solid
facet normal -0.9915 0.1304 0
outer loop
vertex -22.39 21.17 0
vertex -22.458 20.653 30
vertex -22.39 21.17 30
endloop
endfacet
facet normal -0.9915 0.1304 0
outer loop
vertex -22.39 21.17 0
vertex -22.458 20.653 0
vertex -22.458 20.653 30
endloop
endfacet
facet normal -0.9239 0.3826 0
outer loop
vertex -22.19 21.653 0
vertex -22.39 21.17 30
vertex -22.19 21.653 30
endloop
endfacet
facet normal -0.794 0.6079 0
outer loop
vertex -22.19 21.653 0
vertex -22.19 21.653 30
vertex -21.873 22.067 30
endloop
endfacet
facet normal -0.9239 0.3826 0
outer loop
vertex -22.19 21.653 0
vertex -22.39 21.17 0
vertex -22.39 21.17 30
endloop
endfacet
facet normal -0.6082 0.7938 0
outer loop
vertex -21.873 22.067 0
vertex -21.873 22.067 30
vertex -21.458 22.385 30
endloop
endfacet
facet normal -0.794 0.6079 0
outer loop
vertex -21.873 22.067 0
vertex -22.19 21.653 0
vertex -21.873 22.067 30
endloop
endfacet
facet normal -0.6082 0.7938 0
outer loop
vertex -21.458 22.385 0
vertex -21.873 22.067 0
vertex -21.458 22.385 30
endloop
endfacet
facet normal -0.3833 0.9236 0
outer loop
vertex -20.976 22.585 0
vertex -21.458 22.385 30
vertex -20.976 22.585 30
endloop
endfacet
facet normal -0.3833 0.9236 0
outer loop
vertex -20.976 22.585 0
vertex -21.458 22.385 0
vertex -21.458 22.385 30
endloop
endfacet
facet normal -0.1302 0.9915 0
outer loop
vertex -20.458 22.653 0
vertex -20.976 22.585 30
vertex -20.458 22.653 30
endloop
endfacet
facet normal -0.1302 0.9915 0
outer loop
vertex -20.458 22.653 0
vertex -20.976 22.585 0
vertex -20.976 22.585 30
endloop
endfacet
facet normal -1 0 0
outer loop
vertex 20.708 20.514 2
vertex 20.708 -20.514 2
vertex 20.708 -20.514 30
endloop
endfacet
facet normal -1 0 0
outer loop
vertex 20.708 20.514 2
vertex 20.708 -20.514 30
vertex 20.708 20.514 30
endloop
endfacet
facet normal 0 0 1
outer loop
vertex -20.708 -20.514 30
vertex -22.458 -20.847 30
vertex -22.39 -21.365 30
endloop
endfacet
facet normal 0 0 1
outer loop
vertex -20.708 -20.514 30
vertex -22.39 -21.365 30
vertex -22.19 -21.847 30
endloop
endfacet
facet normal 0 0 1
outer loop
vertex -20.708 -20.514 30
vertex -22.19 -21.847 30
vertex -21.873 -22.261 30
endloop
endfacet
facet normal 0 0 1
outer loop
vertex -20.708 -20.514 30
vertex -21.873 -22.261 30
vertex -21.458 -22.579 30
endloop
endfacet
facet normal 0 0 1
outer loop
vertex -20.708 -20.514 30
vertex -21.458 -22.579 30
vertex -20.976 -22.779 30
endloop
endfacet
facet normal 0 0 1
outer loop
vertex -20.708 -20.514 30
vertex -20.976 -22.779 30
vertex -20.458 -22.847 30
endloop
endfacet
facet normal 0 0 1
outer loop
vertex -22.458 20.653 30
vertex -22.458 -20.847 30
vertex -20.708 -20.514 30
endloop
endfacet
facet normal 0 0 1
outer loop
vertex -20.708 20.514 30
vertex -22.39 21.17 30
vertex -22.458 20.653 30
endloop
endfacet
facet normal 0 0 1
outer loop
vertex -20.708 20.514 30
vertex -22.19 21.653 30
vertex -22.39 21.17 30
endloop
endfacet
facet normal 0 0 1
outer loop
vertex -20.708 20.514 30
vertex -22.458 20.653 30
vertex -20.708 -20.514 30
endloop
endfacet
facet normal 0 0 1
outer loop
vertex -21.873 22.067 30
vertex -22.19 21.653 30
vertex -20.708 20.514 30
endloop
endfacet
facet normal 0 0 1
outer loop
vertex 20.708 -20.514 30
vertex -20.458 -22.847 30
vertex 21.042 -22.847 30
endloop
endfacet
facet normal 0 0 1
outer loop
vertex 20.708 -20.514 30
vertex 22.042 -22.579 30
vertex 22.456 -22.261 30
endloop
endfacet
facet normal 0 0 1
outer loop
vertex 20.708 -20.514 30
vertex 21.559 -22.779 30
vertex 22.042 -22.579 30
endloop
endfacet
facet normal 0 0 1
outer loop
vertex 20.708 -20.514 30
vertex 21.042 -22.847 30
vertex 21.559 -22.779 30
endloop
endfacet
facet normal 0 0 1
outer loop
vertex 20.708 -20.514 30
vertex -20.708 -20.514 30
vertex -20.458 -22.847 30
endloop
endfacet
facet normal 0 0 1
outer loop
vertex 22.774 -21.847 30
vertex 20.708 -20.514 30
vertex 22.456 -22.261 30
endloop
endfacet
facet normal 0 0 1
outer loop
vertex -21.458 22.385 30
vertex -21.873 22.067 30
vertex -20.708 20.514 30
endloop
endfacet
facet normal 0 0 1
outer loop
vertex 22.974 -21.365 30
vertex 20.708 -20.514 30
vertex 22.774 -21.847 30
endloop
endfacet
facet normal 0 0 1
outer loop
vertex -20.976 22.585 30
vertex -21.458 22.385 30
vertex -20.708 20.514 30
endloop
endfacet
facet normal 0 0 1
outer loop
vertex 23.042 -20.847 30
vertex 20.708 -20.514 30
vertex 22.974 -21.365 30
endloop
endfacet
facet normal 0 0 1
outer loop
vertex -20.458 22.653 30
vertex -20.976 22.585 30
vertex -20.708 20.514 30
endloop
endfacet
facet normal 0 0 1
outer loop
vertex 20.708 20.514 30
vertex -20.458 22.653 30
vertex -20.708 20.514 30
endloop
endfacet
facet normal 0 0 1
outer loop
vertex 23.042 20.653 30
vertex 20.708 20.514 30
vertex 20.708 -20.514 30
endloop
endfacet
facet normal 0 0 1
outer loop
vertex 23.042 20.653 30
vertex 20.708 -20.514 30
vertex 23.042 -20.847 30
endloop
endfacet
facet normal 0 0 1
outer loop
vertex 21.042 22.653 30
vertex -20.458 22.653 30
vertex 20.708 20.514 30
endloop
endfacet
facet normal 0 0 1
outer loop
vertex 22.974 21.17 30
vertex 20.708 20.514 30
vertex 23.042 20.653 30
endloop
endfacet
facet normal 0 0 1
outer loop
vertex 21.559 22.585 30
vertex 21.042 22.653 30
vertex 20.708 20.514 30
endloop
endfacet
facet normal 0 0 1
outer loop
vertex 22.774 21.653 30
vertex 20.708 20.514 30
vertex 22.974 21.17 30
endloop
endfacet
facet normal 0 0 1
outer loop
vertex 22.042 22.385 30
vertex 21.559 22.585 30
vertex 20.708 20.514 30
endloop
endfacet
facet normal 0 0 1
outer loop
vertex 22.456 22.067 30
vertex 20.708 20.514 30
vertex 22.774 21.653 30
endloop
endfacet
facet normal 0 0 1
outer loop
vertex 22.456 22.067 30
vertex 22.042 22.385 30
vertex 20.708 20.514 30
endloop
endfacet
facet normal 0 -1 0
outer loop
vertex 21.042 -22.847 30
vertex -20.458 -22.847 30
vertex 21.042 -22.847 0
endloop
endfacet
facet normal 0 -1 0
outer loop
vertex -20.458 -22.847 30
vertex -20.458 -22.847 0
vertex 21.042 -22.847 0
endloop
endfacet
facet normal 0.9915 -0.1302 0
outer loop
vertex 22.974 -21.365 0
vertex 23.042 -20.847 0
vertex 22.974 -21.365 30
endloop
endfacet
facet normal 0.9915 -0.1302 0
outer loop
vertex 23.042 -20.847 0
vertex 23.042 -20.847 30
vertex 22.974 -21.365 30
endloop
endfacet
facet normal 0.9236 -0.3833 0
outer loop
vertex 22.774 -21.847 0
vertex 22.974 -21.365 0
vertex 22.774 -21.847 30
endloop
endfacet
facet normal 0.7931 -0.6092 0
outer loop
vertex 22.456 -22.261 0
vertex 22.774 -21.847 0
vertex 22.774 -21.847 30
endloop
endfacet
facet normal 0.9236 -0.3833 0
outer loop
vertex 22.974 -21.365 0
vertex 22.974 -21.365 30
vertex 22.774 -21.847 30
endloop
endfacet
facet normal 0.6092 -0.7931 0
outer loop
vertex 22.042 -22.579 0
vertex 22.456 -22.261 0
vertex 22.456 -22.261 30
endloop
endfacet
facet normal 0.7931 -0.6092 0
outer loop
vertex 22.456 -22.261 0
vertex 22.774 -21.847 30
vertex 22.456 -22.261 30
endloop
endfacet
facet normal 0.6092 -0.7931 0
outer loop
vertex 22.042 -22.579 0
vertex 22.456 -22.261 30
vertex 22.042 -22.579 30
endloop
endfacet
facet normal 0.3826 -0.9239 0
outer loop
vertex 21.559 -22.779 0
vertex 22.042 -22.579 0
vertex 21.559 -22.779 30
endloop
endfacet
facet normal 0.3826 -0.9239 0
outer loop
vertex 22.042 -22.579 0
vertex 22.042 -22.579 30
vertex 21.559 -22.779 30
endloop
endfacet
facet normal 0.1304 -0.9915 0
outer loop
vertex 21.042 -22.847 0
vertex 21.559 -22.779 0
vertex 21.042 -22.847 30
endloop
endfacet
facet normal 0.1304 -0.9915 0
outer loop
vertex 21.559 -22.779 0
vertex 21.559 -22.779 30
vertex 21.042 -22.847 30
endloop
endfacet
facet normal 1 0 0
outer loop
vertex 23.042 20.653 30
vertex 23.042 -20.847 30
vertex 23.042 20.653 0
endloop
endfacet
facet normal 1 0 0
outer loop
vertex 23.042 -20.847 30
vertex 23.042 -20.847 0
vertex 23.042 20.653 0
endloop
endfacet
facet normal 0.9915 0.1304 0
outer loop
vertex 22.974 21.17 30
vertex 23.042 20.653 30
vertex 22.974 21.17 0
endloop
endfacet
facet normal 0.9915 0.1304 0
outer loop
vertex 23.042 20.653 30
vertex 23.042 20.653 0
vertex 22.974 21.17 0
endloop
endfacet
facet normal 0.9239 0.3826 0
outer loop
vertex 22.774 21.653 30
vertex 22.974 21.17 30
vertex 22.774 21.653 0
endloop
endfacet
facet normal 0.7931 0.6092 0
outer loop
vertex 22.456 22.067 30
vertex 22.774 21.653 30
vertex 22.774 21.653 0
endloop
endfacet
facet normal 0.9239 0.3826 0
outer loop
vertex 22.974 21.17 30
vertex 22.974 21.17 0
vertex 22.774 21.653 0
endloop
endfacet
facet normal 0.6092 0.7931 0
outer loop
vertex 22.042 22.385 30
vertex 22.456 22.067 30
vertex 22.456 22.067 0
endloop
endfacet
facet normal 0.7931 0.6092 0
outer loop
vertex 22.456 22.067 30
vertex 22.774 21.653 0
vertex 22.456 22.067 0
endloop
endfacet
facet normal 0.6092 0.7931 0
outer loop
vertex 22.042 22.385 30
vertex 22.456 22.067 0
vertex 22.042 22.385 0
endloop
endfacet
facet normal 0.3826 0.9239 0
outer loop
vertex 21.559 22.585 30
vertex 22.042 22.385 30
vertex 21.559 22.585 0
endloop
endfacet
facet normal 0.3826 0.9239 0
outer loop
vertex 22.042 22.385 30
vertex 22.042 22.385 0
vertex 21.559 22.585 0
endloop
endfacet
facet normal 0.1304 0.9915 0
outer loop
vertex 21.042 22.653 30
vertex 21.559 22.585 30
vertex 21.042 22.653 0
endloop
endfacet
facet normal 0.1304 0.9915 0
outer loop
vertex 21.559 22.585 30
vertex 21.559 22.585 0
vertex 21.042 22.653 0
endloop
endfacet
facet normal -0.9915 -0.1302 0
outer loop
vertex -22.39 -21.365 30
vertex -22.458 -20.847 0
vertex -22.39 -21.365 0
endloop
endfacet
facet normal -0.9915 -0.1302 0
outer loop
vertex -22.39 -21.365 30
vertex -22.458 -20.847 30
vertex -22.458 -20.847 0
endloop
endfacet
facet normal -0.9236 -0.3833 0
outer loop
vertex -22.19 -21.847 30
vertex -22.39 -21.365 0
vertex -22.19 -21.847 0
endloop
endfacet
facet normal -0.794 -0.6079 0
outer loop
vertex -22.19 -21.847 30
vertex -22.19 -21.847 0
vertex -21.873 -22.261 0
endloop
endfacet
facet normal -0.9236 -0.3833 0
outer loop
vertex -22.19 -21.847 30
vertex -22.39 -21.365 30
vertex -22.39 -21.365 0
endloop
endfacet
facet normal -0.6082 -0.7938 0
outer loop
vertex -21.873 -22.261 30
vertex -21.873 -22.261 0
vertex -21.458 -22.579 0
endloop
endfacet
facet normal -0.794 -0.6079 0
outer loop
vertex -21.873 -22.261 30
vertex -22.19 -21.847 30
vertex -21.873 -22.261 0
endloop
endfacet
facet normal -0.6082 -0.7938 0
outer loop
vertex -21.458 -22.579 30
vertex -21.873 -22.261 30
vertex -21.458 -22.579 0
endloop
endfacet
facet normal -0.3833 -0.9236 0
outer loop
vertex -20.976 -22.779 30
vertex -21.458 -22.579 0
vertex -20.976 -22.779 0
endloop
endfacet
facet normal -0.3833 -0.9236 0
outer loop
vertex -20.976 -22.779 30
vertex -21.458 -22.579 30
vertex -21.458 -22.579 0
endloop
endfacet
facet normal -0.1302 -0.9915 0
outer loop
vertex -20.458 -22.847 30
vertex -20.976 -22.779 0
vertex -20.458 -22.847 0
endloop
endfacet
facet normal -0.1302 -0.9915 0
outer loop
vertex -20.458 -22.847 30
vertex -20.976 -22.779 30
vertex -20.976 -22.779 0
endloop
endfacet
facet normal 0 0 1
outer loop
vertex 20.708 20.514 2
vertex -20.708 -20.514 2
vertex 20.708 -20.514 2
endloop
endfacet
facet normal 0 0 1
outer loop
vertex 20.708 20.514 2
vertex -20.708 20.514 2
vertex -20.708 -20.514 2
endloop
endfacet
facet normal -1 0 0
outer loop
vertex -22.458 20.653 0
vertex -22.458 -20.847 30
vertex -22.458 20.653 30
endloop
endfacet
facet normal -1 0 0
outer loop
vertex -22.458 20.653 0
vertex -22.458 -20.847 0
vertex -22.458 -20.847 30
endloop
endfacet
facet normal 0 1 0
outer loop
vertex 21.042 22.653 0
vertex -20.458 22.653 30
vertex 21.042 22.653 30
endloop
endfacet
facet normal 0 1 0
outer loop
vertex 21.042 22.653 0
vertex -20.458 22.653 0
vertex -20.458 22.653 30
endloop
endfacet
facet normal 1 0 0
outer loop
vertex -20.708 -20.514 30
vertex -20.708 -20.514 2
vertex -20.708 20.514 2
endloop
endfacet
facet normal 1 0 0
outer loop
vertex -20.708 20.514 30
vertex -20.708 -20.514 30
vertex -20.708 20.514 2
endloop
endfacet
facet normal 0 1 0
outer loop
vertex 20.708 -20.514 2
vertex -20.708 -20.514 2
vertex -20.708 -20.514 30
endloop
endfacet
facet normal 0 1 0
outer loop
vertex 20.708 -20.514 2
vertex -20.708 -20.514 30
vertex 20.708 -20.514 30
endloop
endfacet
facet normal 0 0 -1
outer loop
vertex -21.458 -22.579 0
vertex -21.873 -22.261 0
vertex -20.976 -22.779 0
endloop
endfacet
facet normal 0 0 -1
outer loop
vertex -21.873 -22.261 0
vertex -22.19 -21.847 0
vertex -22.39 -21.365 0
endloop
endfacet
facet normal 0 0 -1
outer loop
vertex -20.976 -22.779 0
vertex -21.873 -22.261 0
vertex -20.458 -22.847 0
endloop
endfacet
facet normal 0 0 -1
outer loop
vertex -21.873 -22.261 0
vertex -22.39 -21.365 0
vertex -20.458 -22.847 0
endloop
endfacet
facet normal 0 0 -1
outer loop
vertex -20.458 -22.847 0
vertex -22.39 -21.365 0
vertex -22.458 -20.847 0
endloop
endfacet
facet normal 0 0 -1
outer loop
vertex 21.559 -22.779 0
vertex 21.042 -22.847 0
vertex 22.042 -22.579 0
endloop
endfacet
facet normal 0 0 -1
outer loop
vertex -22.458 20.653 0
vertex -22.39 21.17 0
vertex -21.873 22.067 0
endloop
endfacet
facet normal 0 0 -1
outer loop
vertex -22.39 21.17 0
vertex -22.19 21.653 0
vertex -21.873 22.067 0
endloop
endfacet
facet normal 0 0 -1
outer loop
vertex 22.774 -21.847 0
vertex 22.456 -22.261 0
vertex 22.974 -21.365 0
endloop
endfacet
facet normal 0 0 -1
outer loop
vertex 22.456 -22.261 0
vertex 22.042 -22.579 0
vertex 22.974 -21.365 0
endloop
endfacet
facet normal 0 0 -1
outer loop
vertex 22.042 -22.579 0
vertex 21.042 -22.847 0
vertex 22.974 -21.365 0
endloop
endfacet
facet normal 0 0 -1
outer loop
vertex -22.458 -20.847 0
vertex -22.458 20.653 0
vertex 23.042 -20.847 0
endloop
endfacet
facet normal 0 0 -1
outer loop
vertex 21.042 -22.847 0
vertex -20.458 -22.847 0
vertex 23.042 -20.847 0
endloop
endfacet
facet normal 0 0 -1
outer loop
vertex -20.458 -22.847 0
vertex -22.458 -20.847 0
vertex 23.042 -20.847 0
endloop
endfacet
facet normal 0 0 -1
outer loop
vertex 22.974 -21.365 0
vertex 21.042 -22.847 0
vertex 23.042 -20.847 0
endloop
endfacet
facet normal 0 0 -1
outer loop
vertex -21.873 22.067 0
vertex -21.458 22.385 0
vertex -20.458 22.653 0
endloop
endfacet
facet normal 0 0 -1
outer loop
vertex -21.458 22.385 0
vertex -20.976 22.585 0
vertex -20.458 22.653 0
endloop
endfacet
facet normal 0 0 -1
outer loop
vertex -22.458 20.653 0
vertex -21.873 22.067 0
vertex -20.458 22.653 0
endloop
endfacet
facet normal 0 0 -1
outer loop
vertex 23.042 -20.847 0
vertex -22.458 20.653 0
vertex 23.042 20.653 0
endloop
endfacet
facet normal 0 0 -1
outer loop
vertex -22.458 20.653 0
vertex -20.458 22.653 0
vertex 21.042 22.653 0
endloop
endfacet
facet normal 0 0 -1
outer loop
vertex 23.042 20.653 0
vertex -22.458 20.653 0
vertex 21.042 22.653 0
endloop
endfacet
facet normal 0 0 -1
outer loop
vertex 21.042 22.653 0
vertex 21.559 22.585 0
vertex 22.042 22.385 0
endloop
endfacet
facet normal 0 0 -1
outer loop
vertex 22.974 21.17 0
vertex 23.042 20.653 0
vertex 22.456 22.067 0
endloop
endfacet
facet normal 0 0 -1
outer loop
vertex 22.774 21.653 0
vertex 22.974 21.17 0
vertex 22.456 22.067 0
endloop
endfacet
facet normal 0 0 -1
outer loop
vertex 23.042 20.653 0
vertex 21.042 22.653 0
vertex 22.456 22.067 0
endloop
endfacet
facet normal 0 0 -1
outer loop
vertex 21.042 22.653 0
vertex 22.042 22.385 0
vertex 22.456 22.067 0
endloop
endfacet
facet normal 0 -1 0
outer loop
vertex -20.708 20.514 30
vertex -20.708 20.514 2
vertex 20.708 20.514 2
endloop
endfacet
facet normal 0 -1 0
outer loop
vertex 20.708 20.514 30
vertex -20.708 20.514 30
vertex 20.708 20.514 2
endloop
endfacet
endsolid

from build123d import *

# Parameters (mm, degrees)
F0_W     = 45.500002
F0_H     = 45.500004
F0_W_2   = 41.416668
F0_H_2   = 41.027776
F1_DEPTH = 2
F2_DEPTH = 30
F3_R     = 2


with BuildPart() as f1:
    # F0 (on Top) → F1 (new body)
    with BuildSketch(Plane.XY):
        with Locations((0.291666, -0.097222)):
            Rectangle(F0_W, F0_H)
        Rectangle(F0_W_2, F0_H_2, mode=Mode.SUBTRACT)
        Rectangle(F0_W_2, F0_H_2)
    extrude(amount=F1_DEPTH)

    # F0 (on Top) → F2 (join)
    with BuildSketch(Plane.XY):
        with Locations((0.291666, -0.097222)):
            Rectangle(F0_W, F0_H)
        Rectangle(F0_W_2, F0_H_2, mode=Mode.SUBTRACT)
    extrude(amount=F2_DEPTH)

    # F3
    f3_edges = [f1.edges().sort_by_distance(p)[0] for p in [
        (-22.458335, -22.847224, 15),
        (23.041667, -22.847224, 15),
        (23.041667, 22.65278, 15),
        (-22.458335, 22.65278, 15),
    ]]
    fillet(f3_edges, radius=F3_R)


solid = f1.part
